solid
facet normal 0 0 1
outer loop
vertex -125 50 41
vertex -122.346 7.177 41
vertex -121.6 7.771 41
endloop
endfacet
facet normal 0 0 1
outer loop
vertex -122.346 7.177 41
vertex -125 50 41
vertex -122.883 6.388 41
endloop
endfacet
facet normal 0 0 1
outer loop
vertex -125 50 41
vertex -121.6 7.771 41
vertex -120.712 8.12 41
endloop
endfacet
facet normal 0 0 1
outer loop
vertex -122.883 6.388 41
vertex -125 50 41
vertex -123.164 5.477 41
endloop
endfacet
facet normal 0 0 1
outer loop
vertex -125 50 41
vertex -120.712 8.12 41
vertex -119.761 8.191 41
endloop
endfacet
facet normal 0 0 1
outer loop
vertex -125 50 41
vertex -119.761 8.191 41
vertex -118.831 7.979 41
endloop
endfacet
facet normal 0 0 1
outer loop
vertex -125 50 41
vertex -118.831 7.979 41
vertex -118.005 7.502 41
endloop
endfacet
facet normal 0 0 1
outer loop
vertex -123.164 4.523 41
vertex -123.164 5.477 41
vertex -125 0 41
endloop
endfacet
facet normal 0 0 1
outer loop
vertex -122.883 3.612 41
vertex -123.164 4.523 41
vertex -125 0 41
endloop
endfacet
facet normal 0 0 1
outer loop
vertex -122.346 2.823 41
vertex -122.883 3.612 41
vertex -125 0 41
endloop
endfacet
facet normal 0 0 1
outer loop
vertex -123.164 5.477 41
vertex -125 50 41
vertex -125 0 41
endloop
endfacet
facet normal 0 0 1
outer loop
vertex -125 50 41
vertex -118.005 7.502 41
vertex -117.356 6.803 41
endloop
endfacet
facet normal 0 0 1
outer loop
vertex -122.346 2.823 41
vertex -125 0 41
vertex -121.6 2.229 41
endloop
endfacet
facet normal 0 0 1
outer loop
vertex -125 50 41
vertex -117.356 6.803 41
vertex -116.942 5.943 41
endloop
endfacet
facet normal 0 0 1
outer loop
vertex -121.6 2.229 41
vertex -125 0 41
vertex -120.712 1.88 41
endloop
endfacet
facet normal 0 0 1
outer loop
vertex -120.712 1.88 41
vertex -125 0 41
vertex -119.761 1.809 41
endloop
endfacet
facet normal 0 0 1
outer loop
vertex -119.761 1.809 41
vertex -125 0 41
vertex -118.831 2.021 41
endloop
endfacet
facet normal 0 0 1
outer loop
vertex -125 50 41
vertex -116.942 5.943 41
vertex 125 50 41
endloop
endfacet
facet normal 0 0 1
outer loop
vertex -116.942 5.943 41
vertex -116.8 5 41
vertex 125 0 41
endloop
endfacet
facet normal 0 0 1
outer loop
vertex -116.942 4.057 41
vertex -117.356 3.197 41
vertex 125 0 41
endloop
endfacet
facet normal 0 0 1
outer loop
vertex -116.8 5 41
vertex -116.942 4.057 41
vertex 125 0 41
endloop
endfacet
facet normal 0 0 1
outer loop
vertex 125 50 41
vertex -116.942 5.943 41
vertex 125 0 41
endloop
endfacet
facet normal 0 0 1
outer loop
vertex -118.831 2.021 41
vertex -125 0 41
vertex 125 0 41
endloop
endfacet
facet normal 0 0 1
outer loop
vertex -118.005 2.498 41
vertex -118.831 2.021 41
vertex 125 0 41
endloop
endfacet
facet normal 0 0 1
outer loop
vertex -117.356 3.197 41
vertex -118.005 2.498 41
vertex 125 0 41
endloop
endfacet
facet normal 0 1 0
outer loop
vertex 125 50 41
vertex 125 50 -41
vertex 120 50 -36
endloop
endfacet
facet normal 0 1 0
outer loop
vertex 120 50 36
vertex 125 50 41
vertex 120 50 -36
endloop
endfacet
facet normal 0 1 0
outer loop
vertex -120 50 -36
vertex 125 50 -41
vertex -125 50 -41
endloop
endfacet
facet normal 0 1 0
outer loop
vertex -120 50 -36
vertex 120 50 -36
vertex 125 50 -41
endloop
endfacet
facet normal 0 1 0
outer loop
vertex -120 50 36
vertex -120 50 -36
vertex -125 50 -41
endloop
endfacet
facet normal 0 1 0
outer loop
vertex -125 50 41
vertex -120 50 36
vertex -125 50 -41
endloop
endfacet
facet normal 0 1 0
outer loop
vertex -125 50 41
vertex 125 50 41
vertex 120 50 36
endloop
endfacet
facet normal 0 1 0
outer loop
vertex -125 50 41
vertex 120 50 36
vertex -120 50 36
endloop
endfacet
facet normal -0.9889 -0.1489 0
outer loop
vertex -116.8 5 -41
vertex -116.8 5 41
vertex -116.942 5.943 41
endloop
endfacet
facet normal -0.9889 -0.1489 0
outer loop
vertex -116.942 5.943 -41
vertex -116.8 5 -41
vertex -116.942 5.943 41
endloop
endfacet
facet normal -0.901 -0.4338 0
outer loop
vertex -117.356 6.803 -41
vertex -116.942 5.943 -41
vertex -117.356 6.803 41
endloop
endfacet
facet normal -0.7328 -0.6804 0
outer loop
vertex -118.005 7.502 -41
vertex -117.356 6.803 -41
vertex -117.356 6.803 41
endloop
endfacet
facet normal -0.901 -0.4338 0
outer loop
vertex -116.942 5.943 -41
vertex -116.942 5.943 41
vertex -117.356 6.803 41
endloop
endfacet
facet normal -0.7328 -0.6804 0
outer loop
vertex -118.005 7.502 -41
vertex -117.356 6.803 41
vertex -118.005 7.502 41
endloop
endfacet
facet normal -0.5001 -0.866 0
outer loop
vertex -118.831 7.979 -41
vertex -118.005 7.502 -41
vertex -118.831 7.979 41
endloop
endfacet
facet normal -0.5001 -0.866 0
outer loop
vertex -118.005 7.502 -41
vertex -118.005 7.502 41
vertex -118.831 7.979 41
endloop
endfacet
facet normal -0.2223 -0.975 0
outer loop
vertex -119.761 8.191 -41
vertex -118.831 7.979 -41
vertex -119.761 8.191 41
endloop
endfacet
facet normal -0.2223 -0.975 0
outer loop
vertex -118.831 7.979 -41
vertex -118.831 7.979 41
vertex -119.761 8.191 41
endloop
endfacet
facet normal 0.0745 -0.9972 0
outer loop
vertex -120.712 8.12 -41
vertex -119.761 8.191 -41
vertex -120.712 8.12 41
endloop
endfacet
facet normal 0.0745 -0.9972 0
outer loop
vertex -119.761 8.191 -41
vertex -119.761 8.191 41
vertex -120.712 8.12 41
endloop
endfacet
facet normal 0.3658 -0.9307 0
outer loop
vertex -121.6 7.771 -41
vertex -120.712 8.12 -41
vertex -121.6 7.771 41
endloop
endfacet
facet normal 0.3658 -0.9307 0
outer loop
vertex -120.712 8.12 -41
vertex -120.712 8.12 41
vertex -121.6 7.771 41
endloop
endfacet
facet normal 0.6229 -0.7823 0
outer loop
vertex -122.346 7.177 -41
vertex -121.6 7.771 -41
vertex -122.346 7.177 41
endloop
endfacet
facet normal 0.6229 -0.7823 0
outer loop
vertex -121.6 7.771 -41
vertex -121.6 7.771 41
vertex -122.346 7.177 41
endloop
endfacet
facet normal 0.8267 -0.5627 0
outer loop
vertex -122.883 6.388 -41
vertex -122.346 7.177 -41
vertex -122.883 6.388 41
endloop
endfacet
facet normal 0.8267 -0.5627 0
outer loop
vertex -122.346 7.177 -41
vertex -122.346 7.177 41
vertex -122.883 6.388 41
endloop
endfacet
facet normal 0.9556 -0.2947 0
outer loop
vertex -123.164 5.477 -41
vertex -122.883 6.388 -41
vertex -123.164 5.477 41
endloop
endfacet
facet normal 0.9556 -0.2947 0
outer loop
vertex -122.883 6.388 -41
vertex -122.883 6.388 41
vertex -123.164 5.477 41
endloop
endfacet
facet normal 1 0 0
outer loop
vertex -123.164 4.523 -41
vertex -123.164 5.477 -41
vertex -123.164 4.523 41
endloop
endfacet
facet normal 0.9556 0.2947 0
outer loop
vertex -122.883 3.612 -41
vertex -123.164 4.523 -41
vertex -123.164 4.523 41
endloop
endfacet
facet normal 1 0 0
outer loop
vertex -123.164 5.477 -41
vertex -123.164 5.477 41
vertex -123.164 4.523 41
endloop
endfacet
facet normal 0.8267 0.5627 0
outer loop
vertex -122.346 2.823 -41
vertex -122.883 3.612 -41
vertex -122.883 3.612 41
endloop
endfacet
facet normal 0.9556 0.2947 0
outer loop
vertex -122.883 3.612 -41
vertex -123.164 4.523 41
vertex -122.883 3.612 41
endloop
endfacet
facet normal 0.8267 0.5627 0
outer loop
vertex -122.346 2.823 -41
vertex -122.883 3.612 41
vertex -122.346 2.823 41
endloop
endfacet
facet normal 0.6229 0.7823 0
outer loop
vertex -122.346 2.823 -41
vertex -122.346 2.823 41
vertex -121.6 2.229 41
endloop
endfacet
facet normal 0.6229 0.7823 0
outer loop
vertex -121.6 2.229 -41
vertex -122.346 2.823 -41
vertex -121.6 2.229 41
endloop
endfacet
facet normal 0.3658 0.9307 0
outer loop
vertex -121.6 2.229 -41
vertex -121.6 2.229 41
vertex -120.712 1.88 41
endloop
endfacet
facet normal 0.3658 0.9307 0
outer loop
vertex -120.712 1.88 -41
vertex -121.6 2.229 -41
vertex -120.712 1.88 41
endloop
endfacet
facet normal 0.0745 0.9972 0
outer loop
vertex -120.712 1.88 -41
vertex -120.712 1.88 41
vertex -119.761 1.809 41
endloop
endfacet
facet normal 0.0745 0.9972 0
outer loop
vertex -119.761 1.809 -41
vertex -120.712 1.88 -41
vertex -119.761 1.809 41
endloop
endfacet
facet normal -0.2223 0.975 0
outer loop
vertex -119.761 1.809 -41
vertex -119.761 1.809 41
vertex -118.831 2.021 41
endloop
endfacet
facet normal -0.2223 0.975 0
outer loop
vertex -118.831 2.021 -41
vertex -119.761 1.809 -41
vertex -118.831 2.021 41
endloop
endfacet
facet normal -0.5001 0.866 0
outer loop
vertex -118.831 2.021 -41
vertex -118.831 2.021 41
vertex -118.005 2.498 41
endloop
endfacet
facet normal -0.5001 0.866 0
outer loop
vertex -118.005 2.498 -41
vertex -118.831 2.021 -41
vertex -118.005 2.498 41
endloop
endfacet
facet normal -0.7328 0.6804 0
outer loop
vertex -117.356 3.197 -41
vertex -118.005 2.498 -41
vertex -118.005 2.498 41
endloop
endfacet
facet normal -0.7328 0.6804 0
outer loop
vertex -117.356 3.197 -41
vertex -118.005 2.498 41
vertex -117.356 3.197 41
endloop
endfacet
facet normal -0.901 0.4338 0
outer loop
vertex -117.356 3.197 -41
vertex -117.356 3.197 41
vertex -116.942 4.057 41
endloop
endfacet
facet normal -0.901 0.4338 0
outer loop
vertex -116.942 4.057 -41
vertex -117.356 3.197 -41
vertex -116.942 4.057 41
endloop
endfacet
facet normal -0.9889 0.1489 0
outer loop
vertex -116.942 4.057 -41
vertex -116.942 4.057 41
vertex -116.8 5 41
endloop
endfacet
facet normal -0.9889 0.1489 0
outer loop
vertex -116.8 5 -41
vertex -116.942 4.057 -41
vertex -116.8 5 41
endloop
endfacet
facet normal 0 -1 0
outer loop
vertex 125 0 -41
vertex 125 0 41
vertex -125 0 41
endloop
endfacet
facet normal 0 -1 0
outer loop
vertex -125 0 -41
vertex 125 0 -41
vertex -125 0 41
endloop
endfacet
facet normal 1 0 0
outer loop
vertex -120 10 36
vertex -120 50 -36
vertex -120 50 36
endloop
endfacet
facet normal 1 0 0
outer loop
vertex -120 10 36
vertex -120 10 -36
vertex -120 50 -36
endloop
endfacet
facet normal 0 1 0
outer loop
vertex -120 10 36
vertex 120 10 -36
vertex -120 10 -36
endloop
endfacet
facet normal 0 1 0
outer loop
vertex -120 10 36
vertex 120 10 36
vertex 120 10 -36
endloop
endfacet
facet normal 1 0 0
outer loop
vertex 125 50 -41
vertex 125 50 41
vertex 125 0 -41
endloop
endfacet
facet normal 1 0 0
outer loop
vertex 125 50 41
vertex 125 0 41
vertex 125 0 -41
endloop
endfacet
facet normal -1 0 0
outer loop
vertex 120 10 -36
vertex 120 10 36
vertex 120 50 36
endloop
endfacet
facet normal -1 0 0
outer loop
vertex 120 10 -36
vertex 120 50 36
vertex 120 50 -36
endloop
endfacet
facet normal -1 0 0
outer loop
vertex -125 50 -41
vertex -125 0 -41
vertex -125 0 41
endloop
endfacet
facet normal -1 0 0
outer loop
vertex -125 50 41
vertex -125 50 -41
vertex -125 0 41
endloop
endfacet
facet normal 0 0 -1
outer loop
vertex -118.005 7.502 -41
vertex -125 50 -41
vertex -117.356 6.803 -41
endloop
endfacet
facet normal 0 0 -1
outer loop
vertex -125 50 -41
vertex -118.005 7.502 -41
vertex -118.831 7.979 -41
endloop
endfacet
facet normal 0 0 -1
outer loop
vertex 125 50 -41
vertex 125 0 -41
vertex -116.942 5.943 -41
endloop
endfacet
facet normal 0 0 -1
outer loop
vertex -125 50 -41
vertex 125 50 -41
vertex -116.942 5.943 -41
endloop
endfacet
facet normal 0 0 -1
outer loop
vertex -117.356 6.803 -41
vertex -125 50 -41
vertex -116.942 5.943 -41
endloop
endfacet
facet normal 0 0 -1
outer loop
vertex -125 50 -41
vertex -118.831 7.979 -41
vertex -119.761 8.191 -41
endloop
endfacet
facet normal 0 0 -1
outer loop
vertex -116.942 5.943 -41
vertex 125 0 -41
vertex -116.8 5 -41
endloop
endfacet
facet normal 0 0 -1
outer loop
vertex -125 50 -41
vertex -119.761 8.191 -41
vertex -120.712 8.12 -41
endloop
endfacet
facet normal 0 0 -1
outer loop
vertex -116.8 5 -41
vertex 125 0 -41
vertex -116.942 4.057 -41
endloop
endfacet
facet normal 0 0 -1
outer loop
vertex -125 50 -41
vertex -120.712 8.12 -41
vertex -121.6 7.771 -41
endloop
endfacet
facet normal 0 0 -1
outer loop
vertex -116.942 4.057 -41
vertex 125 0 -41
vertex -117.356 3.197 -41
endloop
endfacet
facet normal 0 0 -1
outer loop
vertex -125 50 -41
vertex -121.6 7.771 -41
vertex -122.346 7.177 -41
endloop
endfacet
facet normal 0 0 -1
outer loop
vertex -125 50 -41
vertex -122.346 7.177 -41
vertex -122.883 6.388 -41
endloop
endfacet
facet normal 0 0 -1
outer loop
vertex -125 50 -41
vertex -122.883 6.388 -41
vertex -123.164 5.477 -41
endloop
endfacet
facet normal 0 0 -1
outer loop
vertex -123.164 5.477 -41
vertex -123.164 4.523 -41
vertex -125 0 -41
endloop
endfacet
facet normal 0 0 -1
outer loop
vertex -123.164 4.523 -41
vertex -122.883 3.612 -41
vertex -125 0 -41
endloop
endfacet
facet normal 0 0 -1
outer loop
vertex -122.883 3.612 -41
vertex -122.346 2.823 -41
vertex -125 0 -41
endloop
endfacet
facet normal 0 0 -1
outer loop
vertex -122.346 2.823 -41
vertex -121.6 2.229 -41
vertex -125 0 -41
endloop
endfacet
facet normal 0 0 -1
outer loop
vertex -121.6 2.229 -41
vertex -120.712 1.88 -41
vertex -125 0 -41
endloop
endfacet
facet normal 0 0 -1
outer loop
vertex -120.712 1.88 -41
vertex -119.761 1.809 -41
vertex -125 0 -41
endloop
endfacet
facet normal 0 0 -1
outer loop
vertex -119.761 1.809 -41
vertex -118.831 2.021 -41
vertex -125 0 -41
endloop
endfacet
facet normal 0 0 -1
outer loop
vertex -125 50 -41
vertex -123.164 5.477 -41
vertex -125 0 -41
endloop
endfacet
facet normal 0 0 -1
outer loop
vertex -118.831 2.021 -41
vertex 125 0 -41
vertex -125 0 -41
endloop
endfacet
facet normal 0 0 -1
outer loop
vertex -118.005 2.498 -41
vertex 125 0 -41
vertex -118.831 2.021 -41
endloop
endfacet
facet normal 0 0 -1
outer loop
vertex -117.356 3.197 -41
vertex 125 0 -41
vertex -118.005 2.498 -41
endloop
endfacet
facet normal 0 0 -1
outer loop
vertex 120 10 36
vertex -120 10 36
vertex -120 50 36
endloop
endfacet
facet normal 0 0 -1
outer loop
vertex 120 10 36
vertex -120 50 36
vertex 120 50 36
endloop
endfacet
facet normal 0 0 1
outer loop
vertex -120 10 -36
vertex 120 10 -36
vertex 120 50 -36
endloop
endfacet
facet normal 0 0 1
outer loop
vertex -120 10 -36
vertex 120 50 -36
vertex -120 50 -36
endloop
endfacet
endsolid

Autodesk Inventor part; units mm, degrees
ref_plane "YZ Plane" through (0, 0, 0) normal (1, 0, 0) x (0, 1, 0)
ref_plane "XZ Plane" through (0, 0, 0) normal (0, 1, 0) x (-1, 0, 0)
ref_plane "XY Plane" through (0, 0, 0) normal (0, 0, 1) x (1, 0, 0)
sketch "Sketch1" plane through (0, 0, 0) normal (0, 1, 0) x (-1, 0, 0)
  line L0 (120, 36) -> (-120, 36)
  line L1 (-120, 36) -> (-120, -36)
  line L2 (-120, -36) -> (120, -36)
  line L3 (120, -36) -> (120, 36)
  line L4 (120, 36) -> (-120, -36) construction
  line L5 (-120, 36) -> (120, -36) construction
  line L6 (125, 41) -> (-125, 41)
  line L7 (-125, 41) -> (-125, -41)
  line L8 (-125, -41) -> (125, -41)
  line L9 (125, -41) -> (125, 41)
  point P0 (0, 0)
  dimension "d0" = 72
  dimension "d1" = 240
  dimension "d2" = 5
extrude "Extrusion1" add sketch "Sketch1" along normal blind 10 contours L3 L2 L1 L0
extrude "Extrusion2" add sketch "Sketch1" along normal blind 50
sketch "Sketch2" plane through (-125, 0, 41) normal (0, 0, 1) x (1, 0, 0)
  circle A0 centre (5, 5) radius 3.2
  line L0 (0, 0) -> (0, 50) projected
  line L1 (0, 0) -> (250, 0) projected
  point P0 (125, 0)
  dimension "d9" = 6.4
  dimension "d22" = 5
  dimension "d23" = 5
extrude "Extrusion3" cut sketch "Sketch2" against normal through all
sketch "Sketch3" plane through (0, 0, 0) normal (0, -1, 0) x (1, 0, 0)
  point P0 (0, 0)
properties part number "GiveBox"
